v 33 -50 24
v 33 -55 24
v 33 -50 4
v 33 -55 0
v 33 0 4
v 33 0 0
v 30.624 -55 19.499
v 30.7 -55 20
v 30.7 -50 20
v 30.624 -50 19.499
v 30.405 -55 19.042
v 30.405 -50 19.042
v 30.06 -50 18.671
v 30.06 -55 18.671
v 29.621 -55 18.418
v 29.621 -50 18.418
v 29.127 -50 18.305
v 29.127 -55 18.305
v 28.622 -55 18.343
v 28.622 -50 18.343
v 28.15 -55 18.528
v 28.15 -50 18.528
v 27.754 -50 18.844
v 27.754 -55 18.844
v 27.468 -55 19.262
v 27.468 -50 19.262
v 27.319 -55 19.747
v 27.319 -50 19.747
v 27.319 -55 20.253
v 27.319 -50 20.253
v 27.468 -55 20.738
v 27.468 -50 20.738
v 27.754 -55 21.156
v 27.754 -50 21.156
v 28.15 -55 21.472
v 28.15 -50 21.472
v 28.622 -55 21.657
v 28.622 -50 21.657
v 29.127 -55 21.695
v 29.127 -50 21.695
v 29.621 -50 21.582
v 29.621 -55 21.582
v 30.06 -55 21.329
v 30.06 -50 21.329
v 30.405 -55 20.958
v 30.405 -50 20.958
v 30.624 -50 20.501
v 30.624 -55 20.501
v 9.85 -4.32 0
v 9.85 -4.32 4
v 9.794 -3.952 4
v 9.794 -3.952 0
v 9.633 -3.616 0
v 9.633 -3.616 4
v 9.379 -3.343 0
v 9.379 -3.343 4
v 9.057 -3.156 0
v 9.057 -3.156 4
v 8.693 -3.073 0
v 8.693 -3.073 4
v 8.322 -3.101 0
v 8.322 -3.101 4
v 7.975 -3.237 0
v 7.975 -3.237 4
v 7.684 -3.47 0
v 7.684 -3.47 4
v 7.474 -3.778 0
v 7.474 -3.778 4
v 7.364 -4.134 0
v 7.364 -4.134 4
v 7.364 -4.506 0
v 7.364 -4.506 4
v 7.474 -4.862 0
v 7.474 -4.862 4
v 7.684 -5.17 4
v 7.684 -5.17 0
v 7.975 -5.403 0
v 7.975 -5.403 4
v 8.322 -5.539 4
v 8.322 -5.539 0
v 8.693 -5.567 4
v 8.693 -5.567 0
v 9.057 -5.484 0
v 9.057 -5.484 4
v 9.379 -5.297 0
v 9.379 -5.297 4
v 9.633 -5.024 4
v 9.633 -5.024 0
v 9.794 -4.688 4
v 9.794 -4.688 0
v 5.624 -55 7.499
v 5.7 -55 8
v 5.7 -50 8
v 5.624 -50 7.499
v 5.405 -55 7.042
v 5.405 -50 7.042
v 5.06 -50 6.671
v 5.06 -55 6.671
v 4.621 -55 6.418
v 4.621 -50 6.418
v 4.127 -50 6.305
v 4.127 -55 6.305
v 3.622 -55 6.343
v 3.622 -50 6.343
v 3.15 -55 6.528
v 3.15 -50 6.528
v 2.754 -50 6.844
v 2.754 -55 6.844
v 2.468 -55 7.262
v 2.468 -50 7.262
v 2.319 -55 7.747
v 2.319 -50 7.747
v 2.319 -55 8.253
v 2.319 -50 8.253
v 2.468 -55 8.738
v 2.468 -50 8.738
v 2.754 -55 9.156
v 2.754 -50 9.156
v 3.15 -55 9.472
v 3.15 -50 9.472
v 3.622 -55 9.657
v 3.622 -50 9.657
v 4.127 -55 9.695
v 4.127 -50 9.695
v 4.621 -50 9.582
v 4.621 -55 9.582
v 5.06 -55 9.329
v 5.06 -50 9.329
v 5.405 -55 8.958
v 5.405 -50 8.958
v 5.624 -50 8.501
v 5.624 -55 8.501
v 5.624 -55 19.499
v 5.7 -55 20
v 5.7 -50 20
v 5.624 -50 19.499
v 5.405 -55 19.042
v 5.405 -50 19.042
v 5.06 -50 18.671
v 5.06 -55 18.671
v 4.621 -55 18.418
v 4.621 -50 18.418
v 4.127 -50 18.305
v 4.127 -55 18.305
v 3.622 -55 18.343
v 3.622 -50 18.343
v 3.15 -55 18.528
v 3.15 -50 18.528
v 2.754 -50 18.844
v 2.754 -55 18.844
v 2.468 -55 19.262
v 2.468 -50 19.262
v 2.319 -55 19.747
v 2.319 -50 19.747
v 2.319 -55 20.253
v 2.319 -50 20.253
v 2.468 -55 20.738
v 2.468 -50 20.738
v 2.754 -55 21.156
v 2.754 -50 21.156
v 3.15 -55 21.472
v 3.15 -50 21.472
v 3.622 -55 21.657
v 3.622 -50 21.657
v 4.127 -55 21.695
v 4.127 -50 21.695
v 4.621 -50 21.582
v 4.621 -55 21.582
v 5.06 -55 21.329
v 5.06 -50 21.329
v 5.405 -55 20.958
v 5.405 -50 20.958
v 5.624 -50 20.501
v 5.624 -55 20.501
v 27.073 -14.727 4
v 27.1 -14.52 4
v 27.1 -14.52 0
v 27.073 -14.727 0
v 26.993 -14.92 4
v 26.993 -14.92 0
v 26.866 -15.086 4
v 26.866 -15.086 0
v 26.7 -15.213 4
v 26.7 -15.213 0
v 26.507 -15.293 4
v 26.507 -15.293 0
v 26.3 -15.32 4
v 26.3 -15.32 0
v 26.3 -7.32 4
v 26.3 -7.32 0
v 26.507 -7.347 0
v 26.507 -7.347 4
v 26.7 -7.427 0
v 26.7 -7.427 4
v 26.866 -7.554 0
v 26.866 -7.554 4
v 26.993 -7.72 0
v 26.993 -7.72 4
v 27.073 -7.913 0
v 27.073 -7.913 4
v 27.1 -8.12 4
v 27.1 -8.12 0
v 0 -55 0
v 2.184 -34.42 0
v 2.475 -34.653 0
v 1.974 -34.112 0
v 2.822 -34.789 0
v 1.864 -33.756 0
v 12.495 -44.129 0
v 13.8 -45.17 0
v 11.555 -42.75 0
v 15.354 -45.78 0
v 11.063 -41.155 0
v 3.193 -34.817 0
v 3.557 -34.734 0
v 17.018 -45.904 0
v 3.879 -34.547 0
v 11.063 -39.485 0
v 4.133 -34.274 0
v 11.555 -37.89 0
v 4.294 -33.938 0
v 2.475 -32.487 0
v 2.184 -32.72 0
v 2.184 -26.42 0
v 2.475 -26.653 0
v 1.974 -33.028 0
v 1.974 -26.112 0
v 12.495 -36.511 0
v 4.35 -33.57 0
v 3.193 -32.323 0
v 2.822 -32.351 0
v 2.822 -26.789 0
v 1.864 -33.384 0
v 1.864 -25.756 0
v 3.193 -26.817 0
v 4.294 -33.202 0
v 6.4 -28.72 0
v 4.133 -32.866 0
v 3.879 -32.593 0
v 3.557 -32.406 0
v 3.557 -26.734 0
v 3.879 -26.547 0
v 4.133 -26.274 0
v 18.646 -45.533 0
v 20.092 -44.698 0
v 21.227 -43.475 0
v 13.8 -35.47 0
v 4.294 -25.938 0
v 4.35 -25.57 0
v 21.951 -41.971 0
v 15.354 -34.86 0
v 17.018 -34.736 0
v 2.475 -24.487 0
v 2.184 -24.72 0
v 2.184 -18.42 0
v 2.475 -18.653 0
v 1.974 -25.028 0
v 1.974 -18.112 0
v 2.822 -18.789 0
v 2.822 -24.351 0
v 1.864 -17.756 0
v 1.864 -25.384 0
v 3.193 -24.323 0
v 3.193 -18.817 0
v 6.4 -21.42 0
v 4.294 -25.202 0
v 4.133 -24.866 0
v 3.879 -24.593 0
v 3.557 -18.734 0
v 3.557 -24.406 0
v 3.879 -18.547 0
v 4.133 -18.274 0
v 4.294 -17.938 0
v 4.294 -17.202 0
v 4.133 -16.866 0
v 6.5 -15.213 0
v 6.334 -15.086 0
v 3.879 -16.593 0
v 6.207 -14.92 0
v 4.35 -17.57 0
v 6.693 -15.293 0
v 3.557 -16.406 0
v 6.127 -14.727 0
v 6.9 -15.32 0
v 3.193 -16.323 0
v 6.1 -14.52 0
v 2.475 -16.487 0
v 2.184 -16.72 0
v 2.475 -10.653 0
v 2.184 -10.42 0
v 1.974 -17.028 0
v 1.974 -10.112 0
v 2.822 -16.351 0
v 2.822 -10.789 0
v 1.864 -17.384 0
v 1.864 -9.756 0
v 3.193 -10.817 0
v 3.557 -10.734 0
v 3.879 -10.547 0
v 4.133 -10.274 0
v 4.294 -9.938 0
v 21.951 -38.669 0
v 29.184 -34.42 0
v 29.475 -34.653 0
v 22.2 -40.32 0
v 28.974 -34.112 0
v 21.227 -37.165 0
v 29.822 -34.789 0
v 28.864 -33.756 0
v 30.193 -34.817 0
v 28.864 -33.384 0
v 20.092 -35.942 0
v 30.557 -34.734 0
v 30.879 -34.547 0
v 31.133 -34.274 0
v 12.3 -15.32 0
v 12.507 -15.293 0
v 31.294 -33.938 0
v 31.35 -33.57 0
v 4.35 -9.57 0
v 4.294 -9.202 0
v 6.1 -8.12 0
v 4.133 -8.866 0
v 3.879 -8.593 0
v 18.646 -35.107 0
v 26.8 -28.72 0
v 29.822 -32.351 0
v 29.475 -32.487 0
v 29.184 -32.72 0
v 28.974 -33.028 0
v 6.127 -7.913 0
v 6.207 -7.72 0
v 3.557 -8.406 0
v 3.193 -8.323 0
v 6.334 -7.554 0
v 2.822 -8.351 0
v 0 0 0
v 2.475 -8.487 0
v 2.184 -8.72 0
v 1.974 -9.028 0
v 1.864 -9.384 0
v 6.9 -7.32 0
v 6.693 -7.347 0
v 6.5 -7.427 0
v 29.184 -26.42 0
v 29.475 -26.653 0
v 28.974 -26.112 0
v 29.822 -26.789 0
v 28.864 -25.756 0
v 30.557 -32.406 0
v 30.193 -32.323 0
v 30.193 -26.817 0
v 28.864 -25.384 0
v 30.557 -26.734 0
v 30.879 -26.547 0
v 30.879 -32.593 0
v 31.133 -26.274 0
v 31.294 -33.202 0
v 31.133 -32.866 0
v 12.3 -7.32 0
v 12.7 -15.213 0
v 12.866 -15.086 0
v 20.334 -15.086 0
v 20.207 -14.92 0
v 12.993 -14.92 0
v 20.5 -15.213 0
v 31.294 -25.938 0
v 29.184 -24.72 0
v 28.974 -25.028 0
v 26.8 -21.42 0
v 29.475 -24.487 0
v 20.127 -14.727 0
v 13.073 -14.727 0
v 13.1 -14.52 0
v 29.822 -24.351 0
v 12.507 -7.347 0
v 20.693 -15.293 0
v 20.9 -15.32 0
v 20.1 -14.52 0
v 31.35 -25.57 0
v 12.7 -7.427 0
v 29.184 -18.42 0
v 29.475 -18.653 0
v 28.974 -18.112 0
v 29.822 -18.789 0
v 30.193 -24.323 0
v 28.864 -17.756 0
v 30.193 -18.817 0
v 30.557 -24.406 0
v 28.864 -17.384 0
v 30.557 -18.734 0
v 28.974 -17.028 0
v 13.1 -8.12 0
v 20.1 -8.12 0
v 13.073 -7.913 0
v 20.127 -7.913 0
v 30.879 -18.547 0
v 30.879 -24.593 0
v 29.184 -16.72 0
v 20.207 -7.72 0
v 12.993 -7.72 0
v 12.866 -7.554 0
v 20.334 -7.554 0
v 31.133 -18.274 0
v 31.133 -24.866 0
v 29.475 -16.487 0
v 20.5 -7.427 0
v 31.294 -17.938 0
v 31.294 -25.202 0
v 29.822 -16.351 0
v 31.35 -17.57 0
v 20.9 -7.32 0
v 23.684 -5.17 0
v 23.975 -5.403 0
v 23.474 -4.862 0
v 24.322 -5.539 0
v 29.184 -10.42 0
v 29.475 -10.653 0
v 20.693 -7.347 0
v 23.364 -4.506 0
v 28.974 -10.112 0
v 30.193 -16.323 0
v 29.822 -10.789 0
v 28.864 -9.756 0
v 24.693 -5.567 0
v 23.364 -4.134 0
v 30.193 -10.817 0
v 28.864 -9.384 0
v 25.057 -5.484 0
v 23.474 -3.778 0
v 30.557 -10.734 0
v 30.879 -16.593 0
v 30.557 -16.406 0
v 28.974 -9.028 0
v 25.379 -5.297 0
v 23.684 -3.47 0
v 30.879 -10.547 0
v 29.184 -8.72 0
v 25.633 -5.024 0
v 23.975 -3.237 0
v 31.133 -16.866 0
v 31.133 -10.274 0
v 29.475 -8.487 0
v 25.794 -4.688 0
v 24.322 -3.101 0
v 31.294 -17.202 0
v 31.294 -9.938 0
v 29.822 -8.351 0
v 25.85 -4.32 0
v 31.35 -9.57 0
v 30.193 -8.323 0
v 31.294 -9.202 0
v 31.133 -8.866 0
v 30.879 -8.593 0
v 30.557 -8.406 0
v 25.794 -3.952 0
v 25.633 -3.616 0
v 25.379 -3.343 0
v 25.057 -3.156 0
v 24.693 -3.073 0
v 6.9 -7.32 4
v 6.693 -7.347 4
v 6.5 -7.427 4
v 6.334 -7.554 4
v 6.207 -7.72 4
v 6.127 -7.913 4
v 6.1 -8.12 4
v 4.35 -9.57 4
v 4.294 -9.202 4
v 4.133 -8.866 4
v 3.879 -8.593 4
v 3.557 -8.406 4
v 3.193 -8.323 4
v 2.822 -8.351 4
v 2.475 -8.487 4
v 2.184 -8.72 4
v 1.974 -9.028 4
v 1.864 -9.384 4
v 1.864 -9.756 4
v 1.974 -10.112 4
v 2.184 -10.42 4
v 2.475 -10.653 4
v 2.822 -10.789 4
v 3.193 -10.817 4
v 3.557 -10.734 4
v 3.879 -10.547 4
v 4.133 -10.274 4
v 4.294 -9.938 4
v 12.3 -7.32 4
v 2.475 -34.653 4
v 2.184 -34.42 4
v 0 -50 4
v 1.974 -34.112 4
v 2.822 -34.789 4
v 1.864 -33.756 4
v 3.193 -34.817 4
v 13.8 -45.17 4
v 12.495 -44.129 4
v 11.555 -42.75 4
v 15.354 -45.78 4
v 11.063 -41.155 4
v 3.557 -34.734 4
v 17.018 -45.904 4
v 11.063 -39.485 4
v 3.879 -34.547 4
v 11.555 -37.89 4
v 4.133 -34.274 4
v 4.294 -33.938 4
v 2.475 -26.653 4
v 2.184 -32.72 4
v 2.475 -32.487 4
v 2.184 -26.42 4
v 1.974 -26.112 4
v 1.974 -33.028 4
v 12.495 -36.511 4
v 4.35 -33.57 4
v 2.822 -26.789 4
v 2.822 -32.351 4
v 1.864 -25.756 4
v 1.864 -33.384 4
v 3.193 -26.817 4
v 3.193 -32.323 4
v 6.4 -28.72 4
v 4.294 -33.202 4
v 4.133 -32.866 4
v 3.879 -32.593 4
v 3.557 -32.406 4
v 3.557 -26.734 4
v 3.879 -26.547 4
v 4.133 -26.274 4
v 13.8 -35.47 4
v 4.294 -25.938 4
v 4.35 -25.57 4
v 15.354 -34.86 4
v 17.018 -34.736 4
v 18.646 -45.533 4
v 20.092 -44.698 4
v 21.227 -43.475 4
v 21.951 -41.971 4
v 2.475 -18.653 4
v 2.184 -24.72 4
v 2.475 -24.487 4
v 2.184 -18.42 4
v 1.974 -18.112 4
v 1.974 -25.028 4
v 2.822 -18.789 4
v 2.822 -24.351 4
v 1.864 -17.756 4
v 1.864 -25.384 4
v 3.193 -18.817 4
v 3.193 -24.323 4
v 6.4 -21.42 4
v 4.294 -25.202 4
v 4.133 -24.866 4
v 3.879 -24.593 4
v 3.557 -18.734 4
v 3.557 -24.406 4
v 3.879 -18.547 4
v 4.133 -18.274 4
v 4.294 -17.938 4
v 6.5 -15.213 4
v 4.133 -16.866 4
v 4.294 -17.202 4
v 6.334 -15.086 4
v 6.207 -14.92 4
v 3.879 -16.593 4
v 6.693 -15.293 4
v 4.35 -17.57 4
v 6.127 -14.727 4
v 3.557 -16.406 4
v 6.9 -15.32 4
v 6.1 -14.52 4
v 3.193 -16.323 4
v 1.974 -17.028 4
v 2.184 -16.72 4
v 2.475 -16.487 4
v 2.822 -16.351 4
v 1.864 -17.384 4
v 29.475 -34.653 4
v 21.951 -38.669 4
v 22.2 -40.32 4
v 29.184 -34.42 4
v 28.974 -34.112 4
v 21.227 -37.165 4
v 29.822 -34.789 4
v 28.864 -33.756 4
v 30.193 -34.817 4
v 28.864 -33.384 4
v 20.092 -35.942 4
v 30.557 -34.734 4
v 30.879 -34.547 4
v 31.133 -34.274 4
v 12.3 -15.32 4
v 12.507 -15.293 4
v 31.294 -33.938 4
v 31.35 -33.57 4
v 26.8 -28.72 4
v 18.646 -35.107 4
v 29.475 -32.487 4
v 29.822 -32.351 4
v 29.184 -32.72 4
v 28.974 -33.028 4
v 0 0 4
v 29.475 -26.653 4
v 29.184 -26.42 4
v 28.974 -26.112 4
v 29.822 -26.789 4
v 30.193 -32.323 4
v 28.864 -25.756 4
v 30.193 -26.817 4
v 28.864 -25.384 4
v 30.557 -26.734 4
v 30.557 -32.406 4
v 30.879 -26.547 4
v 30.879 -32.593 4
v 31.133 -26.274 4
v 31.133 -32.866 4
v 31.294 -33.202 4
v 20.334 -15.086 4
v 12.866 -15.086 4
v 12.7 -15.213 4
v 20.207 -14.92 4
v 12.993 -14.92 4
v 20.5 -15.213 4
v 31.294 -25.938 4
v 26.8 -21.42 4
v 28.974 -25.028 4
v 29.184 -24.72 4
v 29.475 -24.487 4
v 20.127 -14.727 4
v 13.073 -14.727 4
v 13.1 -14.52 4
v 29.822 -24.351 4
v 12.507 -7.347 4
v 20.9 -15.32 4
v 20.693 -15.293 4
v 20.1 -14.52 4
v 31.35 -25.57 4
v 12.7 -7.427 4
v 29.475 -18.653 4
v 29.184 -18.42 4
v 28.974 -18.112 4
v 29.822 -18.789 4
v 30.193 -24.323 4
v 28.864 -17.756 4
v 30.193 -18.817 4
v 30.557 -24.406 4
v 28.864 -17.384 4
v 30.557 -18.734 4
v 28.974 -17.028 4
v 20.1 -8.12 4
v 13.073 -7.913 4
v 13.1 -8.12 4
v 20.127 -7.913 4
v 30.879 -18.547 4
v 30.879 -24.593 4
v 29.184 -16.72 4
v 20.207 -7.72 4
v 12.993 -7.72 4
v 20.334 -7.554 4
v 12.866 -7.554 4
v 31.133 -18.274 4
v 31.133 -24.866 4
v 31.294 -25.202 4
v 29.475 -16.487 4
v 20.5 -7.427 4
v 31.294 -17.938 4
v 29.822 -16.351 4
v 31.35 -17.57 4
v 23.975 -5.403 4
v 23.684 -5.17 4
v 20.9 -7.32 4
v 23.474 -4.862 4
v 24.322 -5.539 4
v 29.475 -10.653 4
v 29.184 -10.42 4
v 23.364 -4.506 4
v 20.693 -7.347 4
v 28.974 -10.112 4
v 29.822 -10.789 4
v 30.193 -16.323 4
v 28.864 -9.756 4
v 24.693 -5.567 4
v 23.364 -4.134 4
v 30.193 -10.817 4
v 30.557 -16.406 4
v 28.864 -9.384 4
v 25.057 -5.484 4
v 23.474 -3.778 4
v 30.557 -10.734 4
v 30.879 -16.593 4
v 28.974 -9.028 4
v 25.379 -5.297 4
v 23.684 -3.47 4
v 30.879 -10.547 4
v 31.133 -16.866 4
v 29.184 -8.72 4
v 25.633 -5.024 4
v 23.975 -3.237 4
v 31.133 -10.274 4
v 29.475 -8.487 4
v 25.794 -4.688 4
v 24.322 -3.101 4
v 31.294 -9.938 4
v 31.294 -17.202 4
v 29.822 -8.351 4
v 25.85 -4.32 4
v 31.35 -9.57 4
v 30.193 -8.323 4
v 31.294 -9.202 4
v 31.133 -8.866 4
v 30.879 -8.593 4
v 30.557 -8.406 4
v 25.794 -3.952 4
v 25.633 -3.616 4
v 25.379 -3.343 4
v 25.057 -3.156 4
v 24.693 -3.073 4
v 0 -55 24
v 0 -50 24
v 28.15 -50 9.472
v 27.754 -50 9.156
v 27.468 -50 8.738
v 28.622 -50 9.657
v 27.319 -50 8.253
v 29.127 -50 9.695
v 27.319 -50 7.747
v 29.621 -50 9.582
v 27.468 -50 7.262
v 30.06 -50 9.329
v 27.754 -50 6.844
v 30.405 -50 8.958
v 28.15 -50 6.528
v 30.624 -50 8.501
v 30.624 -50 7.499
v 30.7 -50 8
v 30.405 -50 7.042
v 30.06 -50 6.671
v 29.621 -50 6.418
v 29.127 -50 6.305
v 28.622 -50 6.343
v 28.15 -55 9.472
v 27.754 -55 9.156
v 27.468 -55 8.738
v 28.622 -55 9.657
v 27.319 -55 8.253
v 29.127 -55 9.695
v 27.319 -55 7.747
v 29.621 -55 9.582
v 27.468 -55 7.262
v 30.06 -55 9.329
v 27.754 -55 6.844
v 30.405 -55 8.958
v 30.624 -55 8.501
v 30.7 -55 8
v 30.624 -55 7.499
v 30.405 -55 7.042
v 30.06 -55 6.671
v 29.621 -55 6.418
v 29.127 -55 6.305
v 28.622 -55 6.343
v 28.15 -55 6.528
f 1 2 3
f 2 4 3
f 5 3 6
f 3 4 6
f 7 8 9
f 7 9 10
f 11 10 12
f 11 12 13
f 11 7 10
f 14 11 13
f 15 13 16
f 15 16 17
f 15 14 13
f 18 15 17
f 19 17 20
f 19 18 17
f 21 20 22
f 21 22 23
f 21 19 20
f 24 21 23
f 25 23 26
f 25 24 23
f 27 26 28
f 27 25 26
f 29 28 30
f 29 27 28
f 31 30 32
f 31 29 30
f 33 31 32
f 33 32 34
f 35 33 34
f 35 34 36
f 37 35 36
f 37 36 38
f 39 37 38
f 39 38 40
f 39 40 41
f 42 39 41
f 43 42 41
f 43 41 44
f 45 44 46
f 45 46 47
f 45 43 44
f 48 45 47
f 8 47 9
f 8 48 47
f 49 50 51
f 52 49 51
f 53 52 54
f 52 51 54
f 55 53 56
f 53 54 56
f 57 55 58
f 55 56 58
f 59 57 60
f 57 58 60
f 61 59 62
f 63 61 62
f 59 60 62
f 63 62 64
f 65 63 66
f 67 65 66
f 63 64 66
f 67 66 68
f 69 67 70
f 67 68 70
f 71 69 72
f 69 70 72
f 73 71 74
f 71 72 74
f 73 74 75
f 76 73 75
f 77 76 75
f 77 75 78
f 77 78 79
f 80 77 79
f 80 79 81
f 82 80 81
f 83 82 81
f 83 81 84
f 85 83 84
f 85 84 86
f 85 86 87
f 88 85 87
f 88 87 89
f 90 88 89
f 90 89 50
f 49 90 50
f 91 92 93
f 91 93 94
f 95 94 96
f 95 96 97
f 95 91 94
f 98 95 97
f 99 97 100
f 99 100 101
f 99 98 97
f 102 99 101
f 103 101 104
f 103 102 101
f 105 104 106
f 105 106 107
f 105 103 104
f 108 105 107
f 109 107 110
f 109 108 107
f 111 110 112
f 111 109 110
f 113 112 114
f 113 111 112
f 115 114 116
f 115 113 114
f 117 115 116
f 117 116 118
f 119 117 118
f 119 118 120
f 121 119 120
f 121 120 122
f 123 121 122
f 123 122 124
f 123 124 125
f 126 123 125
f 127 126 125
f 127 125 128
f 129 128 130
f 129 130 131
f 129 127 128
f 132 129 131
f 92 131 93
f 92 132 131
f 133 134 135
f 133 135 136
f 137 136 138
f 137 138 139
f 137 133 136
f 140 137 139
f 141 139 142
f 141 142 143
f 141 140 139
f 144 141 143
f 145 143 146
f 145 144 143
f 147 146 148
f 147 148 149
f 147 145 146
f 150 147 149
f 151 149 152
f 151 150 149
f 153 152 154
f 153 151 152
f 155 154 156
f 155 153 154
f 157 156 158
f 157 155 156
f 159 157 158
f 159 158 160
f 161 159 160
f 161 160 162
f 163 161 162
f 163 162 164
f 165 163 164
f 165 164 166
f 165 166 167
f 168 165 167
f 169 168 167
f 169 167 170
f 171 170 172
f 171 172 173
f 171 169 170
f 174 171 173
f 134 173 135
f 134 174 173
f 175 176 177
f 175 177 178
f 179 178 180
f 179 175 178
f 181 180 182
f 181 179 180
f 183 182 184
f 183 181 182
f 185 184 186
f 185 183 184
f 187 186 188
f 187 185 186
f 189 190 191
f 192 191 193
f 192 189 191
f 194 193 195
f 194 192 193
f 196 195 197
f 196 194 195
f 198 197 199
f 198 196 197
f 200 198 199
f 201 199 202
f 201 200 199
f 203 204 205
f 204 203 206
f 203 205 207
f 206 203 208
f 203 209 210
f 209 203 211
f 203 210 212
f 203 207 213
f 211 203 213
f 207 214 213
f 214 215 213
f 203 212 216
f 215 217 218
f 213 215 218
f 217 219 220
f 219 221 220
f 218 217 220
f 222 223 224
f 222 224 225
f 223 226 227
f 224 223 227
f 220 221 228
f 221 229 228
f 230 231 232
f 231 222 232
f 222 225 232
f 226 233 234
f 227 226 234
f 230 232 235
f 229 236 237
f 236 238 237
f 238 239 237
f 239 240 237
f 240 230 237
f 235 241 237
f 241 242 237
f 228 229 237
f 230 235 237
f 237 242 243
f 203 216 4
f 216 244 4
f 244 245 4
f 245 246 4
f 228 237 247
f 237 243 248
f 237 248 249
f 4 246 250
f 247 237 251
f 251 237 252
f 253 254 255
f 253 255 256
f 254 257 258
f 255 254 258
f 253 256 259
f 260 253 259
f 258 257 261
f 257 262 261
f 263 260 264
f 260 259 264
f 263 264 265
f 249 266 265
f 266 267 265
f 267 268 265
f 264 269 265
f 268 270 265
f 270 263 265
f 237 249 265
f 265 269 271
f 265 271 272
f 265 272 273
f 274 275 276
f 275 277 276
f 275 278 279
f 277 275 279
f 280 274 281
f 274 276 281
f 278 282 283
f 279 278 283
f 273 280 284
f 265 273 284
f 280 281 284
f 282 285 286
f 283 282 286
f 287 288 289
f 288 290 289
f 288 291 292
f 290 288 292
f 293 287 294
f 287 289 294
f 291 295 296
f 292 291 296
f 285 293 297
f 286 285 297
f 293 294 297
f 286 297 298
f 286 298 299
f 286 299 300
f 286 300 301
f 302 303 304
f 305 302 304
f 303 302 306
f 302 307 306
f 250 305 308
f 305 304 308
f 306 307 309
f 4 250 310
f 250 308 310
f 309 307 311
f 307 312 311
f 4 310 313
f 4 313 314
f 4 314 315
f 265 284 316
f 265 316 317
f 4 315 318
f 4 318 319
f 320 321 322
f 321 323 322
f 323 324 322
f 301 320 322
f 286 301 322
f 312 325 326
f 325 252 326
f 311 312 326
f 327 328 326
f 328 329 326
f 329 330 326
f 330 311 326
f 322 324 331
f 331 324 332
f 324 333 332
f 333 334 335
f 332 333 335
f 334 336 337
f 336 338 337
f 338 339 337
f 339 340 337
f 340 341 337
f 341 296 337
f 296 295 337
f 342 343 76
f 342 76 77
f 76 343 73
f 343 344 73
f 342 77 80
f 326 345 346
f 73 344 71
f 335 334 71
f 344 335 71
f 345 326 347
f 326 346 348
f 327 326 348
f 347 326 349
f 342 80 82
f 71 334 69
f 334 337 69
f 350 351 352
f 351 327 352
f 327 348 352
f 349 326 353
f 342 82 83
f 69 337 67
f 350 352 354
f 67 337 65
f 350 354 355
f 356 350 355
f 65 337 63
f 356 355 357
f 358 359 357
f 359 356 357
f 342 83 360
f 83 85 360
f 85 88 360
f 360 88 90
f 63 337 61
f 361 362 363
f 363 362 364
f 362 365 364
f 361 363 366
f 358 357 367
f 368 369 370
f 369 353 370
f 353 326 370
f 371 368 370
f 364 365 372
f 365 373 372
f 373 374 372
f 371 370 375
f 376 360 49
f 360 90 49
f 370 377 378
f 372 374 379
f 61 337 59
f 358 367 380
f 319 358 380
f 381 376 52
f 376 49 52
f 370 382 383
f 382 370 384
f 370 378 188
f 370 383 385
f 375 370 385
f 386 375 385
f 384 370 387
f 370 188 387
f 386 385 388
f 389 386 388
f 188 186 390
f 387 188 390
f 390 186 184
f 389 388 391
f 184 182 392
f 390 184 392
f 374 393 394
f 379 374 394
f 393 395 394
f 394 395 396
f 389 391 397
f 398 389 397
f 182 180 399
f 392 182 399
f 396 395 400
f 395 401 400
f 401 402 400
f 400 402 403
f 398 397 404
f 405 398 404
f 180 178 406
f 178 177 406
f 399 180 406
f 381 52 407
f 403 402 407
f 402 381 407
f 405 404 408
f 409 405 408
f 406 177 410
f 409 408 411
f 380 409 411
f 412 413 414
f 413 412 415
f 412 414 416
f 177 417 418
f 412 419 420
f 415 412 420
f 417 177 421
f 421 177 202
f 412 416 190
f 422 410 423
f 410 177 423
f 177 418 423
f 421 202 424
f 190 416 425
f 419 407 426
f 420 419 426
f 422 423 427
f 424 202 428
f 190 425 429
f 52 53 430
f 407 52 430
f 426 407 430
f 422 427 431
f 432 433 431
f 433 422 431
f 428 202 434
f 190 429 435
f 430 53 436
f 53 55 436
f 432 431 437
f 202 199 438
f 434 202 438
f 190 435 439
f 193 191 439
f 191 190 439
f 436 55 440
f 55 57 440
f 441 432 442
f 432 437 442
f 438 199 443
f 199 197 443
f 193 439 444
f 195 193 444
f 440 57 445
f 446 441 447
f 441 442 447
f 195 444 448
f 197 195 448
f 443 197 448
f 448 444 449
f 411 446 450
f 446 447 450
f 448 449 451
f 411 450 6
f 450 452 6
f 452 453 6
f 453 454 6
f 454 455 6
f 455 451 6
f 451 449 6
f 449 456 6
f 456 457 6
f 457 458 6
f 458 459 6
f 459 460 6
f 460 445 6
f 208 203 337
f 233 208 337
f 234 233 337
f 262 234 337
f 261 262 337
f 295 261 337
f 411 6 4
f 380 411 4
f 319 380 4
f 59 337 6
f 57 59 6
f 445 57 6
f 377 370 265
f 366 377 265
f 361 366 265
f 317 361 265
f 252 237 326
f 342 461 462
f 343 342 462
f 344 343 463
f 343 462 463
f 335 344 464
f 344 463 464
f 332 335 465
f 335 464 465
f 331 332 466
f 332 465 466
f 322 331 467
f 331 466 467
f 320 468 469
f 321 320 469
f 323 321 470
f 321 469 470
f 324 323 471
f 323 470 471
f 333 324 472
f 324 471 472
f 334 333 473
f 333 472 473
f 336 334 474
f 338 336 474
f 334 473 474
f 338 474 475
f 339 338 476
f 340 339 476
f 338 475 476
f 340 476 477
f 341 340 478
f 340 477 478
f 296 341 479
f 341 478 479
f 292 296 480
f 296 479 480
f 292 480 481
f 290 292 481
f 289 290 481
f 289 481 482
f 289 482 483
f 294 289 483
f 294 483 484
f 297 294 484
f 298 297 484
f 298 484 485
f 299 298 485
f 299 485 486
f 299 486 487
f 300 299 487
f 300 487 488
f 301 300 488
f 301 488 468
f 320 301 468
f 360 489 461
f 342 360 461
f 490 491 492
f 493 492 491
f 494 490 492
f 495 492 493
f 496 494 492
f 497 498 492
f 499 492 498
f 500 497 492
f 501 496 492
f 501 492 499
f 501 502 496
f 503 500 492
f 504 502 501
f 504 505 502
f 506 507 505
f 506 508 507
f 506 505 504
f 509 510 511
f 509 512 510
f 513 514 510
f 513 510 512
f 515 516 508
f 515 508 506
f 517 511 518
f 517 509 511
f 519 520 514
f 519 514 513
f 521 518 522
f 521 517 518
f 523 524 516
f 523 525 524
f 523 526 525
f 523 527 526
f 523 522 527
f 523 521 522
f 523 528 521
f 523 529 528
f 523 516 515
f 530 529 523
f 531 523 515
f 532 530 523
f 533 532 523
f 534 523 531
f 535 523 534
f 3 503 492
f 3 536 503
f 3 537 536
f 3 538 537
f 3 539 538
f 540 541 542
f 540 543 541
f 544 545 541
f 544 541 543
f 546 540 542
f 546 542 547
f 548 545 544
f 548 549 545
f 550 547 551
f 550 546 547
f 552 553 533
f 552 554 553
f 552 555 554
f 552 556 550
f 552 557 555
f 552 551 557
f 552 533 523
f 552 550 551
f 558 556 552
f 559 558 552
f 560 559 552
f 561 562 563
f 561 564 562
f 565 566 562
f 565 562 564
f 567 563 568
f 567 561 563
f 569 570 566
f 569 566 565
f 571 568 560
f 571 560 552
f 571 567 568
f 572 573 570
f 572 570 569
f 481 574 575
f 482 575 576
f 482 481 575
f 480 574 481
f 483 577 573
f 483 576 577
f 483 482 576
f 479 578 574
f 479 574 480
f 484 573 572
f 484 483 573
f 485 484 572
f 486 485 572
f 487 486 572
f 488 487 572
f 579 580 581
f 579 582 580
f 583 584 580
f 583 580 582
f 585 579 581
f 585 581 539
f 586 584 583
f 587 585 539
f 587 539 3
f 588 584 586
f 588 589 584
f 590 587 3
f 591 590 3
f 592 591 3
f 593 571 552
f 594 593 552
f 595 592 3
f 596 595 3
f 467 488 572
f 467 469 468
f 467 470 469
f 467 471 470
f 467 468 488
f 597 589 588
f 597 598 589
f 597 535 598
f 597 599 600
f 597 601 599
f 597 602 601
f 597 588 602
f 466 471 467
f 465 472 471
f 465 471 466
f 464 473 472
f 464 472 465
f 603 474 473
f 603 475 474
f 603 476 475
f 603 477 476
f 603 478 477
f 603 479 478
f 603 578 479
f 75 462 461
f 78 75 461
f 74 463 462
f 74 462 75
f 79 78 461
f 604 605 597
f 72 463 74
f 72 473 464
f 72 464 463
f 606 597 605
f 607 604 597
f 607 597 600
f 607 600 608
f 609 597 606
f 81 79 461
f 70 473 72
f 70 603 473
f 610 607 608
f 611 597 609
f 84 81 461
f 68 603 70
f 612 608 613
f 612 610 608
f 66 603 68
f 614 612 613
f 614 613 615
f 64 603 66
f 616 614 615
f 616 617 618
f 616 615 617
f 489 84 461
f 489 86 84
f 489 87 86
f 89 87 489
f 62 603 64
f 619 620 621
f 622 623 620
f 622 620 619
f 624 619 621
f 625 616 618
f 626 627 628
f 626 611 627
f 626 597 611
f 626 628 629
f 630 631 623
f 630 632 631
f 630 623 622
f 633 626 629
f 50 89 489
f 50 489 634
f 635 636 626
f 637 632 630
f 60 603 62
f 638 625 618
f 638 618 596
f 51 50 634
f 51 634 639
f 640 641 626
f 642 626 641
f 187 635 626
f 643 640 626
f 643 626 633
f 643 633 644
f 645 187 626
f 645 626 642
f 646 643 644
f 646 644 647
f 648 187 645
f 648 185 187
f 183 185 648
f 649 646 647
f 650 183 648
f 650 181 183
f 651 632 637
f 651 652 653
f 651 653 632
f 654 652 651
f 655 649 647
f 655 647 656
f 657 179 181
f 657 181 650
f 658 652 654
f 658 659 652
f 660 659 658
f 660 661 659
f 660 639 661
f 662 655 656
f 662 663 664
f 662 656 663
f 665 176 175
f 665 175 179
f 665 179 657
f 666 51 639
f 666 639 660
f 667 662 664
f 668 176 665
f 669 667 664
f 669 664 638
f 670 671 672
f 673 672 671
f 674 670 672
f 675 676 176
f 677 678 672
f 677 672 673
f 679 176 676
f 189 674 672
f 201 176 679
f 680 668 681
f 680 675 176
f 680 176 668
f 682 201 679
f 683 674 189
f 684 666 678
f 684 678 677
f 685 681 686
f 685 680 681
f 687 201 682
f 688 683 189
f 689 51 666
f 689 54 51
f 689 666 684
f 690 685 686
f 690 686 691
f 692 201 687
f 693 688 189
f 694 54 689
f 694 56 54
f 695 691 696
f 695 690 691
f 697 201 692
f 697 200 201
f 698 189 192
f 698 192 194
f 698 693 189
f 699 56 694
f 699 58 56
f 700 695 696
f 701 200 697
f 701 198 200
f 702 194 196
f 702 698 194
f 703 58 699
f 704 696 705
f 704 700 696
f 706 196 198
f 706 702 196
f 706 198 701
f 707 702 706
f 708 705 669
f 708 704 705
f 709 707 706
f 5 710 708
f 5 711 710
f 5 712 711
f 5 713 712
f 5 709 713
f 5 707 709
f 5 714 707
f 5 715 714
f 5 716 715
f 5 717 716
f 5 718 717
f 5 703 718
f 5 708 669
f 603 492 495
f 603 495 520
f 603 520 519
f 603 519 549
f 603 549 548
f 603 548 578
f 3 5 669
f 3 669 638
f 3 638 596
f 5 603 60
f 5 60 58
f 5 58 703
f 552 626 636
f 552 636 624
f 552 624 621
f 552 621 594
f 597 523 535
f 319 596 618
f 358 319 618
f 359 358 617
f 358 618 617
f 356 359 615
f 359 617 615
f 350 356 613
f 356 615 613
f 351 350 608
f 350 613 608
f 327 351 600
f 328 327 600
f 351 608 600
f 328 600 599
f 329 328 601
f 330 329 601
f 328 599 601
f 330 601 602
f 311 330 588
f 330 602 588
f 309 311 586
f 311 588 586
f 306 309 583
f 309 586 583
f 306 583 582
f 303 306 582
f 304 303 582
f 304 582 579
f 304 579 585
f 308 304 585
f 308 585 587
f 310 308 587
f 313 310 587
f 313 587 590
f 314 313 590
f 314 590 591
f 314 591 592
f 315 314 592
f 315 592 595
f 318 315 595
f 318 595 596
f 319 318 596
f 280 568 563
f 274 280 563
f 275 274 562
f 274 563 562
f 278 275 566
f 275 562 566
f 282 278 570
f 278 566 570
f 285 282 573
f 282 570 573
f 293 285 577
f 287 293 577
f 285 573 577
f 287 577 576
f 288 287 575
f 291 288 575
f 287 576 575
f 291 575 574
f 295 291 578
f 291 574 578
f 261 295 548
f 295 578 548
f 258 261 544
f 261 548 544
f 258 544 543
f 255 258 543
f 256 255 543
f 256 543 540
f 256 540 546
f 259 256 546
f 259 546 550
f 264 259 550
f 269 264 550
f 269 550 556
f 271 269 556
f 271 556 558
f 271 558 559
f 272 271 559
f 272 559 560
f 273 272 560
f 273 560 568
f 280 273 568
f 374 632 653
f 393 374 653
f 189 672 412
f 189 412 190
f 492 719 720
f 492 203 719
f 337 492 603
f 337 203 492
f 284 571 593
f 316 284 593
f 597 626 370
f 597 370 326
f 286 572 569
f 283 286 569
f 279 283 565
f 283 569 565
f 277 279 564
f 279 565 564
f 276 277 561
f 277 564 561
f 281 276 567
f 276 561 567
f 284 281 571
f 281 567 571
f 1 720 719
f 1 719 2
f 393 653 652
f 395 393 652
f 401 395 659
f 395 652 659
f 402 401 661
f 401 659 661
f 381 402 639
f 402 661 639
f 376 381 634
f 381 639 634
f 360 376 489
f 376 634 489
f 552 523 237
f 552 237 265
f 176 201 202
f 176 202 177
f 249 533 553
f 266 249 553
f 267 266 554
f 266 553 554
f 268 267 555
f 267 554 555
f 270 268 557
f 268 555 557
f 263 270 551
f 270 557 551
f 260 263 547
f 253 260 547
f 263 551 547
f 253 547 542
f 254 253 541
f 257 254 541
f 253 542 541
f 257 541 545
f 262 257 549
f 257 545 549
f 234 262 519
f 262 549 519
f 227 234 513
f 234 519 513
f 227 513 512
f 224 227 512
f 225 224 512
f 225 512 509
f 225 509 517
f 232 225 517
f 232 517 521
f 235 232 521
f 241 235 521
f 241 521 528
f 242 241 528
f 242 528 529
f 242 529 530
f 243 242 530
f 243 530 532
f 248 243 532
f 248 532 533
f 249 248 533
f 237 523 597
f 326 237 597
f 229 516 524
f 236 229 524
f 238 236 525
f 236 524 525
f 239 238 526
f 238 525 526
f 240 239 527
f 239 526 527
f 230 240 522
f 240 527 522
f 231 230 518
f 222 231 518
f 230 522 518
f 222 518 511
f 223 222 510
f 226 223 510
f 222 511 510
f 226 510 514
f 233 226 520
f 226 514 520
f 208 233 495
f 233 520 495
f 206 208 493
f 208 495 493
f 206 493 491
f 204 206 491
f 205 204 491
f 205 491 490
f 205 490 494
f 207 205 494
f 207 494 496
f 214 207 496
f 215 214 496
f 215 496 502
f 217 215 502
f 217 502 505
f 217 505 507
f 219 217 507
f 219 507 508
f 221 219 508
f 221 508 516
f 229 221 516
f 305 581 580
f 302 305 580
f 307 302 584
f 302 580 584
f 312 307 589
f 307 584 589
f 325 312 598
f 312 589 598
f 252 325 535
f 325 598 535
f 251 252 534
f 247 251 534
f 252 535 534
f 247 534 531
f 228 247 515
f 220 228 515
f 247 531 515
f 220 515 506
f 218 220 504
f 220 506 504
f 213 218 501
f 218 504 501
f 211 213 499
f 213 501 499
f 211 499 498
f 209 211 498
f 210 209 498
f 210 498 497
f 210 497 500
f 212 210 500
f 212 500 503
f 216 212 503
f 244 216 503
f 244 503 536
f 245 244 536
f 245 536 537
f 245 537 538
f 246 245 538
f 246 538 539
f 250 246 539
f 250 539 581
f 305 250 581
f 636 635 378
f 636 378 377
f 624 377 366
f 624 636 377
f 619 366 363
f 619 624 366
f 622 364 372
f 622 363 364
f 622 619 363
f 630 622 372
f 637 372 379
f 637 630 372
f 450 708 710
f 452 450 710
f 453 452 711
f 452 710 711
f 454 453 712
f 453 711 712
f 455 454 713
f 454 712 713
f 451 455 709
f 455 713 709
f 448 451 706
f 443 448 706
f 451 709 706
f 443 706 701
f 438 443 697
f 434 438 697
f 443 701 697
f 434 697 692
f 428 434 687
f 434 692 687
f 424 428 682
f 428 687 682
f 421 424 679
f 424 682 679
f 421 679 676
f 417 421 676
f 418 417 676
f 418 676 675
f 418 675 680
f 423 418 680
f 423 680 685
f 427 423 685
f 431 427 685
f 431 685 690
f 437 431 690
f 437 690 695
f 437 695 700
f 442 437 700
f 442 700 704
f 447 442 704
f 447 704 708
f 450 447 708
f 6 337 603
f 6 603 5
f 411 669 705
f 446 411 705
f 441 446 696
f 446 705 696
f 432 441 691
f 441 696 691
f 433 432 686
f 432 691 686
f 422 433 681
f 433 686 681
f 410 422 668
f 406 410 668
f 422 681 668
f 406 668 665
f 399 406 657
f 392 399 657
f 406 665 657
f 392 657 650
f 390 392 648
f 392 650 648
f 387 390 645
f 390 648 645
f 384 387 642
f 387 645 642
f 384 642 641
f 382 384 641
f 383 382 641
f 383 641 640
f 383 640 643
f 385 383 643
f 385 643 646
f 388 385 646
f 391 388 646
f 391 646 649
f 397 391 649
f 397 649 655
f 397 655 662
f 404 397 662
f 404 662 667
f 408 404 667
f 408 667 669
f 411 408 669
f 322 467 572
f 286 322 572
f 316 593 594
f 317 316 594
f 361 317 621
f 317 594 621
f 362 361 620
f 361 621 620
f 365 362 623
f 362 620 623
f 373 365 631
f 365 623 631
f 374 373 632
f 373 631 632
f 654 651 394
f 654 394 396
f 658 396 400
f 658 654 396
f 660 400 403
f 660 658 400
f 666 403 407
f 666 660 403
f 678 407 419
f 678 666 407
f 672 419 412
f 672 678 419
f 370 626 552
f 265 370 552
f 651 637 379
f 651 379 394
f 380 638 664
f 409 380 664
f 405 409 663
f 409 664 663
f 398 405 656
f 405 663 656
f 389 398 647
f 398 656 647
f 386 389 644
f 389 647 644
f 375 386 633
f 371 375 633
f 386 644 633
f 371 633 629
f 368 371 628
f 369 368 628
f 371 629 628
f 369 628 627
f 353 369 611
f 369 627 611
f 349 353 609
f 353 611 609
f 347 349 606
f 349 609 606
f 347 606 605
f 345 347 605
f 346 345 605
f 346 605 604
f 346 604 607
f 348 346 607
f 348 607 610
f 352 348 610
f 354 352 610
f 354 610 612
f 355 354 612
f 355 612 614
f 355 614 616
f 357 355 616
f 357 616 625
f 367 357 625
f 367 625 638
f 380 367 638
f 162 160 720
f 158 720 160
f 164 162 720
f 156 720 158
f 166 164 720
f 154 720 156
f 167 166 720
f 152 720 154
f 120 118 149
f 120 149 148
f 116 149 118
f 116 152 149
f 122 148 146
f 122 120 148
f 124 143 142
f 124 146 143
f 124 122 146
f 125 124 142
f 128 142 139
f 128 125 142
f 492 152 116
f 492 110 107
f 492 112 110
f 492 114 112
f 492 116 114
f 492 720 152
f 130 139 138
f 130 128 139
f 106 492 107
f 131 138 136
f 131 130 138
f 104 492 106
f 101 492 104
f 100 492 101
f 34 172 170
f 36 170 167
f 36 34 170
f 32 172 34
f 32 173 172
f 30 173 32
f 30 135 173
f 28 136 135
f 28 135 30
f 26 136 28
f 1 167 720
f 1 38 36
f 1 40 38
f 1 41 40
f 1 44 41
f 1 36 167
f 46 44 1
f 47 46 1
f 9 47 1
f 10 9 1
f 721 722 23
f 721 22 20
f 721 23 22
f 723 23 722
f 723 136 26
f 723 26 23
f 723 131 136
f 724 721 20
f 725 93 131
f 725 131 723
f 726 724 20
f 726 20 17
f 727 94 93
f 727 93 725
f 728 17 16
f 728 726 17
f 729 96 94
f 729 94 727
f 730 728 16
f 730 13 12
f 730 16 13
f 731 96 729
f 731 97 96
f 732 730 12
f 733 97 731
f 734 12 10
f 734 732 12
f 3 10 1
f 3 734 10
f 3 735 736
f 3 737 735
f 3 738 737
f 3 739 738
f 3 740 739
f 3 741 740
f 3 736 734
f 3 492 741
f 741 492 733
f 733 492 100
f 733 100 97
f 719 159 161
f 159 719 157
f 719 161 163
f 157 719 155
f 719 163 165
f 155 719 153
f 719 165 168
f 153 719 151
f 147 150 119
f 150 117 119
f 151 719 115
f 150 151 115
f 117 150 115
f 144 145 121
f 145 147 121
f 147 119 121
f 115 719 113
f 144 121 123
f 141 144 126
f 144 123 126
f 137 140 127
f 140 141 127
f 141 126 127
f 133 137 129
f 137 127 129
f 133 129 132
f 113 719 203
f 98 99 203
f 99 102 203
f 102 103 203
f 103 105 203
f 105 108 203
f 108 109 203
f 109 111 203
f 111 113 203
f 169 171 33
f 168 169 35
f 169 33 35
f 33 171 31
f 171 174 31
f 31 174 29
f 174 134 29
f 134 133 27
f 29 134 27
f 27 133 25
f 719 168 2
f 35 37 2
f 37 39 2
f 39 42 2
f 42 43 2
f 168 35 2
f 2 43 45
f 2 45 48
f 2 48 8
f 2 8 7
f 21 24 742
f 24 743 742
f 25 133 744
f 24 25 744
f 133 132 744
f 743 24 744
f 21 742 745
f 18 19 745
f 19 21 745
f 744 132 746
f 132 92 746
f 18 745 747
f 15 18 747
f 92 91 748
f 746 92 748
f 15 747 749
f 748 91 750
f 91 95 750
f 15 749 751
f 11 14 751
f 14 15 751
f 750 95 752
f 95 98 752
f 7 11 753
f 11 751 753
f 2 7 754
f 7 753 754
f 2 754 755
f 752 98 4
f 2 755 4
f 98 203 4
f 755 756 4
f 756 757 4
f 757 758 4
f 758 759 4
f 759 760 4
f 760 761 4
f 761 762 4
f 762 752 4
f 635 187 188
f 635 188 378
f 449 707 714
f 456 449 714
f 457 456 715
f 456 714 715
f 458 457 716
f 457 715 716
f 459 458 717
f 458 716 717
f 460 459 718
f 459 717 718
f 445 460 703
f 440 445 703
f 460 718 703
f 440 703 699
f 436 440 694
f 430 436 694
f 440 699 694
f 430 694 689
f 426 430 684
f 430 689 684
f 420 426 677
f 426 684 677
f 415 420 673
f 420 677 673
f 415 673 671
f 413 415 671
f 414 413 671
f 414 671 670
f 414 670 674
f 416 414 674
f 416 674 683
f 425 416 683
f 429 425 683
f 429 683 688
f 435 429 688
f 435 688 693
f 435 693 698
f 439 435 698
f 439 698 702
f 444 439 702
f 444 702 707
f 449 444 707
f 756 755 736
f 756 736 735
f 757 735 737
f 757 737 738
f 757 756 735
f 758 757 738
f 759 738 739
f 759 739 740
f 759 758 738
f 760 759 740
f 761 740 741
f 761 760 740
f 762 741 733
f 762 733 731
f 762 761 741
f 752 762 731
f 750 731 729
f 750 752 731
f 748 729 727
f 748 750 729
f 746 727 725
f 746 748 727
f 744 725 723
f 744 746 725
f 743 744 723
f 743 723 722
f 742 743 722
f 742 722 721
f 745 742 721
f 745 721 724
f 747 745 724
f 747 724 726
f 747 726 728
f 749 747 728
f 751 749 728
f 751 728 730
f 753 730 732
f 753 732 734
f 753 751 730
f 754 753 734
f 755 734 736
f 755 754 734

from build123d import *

# Parameters (mm, degrees)
SKETCH1_W                    = 33
SKETCH1_H                    = 55
BOSS_EXTRUDE1_DEPTH          = 4
SKETCH2_W                    = 33
SKETCH2_H                    = 5
BOSS_EXTRUDE2_DEPTH          = 20
CUT_EXTRUDE1_REACH           = 69.186
SKETCH3_R                    = 1.25
SKETCH3_R_2                  = 5.6
M3_START                     = -55
M3_CLEARANCE_HOLE1_OUTLINE_R = 1.7
M3_CLEARANCE_HOLE1_DEPTH     = 5


# Read off the part's stored shape, not the designer's step: M3 Clearance Hole1
with BuildPart() as part:
    # Sketch1 → Boss-Extrude1 (new body)
    with BuildSketch(Plane.XY):
        with Locations((16.5, -27.5)):
            Rectangle(SKETCH1_W, SKETCH1_H)
    extrude(amount=BOSS_EXTRUDE1_DEPTH)

    # Sketch2 → Boss-Extrude2 (add)
    with BuildSketch(Plane.XY.offset(4)):
        with Locations((16.5, -52.5)):
            Rectangle(SKETCH2_W, SKETCH2_H)
    extrude(amount=BOSS_EXTRUDE2_DEPTH)

    # Sketch3 → Cut-Extrude1 (cut, up to next)
    with BuildSketch(Plane.XY.offset(4), mode=Mode.PRIVATE) as cut_extrude1_sk1:
        with Locations((30.1, -9.57)):
            Circle(SKETCH3_R)
    cut_extrude1_tool1 = extrude(cut_extrude1_sk1.sketch, amount=-CUT_EXTRUDE1_REACH, mode=Mode.PRIVATE) & part.part
    # Sketch3 → Cut-Extrude1 (cut, up to next)
    with BuildSketch(Plane.XY.offset(4), mode=Mode.PRIVATE) as cut_extrude1_sk2:
        with Locations((30.1, -17.57)):
            Circle(SKETCH3_R)
    cut_extrude1_tool2 = extrude(cut_extrude1_sk2.sketch, amount=-CUT_EXTRUDE1_REACH, mode=Mode.PRIVATE) & part.part
    # Sketch3 → Cut-Extrude1 (cut, up to next)
    with BuildSketch(Plane.XY.offset(4), mode=Mode.PRIVATE) as cut_extrude1_sk3:
        with Locations((30.1, -25.57)):
            Circle(SKETCH3_R)
    cut_extrude1_tool3 = extrude(cut_extrude1_sk3.sketch, amount=-CUT_EXTRUDE1_REACH, mode=Mode.PRIVATE) & part.part
    # Sketch3 → Cut-Extrude1 (cut, up to next)
    with BuildSketch(Plane.XY.offset(4), mode=Mode.PRIVATE) as cut_extrude1_sk4:
        with Locations((30.1, -33.57)):
            Circle(SKETCH3_R)
    cut_extrude1_tool4 = extrude(cut_extrude1_sk4.sketch, amount=-CUT_EXTRUDE1_REACH, mode=Mode.PRIVATE) & part.part
    # Sketch3 → Cut-Extrude1 (cut, up to next)
    with BuildSketch(Plane.XY.offset(4), mode=Mode.PRIVATE) as cut_extrude1_sk5:
        with Locations((3.1, -33.57)):
            Circle(SKETCH3_R)
    cut_extrude1_tool5 = extrude(cut_extrude1_sk5.sketch, amount=-CUT_EXTRUDE1_REACH, mode=Mode.PRIVATE) & part.part
    # Sketch3 → Cut-Extrude1 (cut, up to next)
    with BuildSketch(Plane.XY.offset(4), mode=Mode.PRIVATE) as cut_extrude1_sk6:
        with Locations((3.1, -25.57)):
            Circle(SKETCH3_R)
    cut_extrude1_tool6 = extrude(cut_extrude1_sk6.sketch, amount=-CUT_EXTRUDE1_REACH, mode=Mode.PRIVATE) & part.part
    # Sketch3 → Cut-Extrude1 (cut, up to next)
    with BuildSketch(Plane.XY.offset(4), mode=Mode.PRIVATE) as cut_extrude1_sk7:
        with Locations((3.1, -17.57)):
            Circle(SKETCH3_R)
    cut_extrude1_tool7 = extrude(cut_extrude1_sk7.sketch, amount=-CUT_EXTRUDE1_REACH, mode=Mode.PRIVATE) & part.part
    # Sketch3 → Cut-Extrude1 (cut, up to next)
    with BuildSketch(Plane.XY.offset(4), mode=Mode.PRIVATE) as cut_extrude1_sk8:
        with Locations((3.1, -9.57)):
            Circle(SKETCH3_R)
    cut_extrude1_tool8 = extrude(cut_extrude1_sk8.sketch, amount=-CUT_EXTRUDE1_REACH, mode=Mode.PRIVATE) & part.part
    # Sketch3 → Cut-Extrude1 (cut, up to next)
    with BuildSketch(Plane.XY.offset(4), mode=Mode.PRIVATE) as cut_extrude1_sk9:
        with Locations((8.6, -4.32)):
            Circle(SKETCH3_R)
    cut_extrude1_tool9 = extrude(cut_extrude1_sk9.sketch, amount=-CUT_EXTRUDE1_REACH, mode=Mode.PRIVATE) & part.part
    # Sketch3 → Cut-Extrude1 (cut, up to next)
    with BuildSketch(Plane.XY.offset(4), mode=Mode.PRIVATE) as cut_extrude1_sk10:
        with Locations((24.6, -4.32)):
            Circle(SKETCH3_R)
    cut_extrude1_tool10 = extrude(cut_extrude1_sk10.sketch, amount=-CUT_EXTRUDE1_REACH, mode=Mode.PRIVATE) & part.part
    # Sketch3 → Cut-Extrude1 (cut, up to next)
    with BuildSketch(Plane.XY.offset(4), mode=Mode.PRIVATE) as cut_extrude1_sk11:
        with Locations((16.6, -40.32)):
            Circle(SKETCH3_R_2)
    cut_extrude1_tool11 = extrude(cut_extrude1_sk11.sketch, amount=-CUT_EXTRUDE1_REACH, mode=Mode.PRIVATE) & part.part
    # Sketch3 → Cut-Extrude1 (cut, up to next)
    with BuildSketch(Plane.XY.offset(4), mode=Mode.PRIVATE) as cut_extrude1_sk12:
        with BuildLine():
            Line((6.9, -15.32), (12.3, -15.32))
            ThreePointArc((12.3, -15.32), (12.865685425, -15.085685425), (13.1, -14.52))
            Line((13.1, -14.52), (13.1, -8.12))
            ThreePointArc((13.1, -8.12), (12.865685425, -7.554314575), (12.3, -7.32))
            Line((12.3, -7.32), (6.9, -7.32))
            ThreePointArc((6.9, -7.32), (6.334314575, -7.554314575), (6.1, -8.12))
            Line((6.1, -8.12), (6.1, -14.52))
            ThreePointArc((6.1, -14.52), (6.334314575, -15.085685425), (6.9, -15.32))
        make_face()
    cut_extrude1_tool12 = extrude(cut_extrude1_sk12.sketch, amount=-CUT_EXTRUDE1_REACH, mode=Mode.PRIVATE) & part.part
    # Sketch3 → Cut-Extrude1 (cut, up to next)
    with BuildSketch(Plane.XY.offset(4), mode=Mode.PRIVATE) as cut_extrude1_sk13:
        with BuildLine():
            Line((27.1, -8.12), (27.1, -14.52))
            ThreePointArc((27.1, -14.52), (26.865685425, -15.085685425), (26.3, -15.32))
            Line((26.3, -15.32), (20.9, -15.32))
            ThreePointArc((20.9, -15.32), (20.334314575, -15.085685425), (20.1, -14.52))
            Line((20.1, -14.52), (20.1, -8.12))
            ThreePointArc((20.1, -8.12), (20.334314575, -7.554314575), (20.9, -7.32))
            Line((20.9, -7.32), (26.3, -7.32))
            ThreePointArc((26.3, -7.32), (26.865685425, -7.554314575), (27.1, -8.12))
        make_face()
    cut_extrude1_tool13 = extrude(cut_extrude1_sk13.sketch, amount=-CUT_EXTRUDE1_REACH, mode=Mode.PRIVATE) & part.part
    # Sketch3 → Cut-Extrude1 (cut, up to next)
    with BuildSketch(Plane.XY.offset(4), mode=Mode.PRIVATE) as cut_extrude1_sk14:
        Polygon((6.4, -21.42), (16.5, -21.42), (16.7, -21.42), (26.8, -21.42), (26.8, -28.72), (16.7, -28.72), (16.5, -28.72), (6.4, -28.72), align=None)
    cut_extrude1_tool14 = extrude(cut_extrude1_sk14.sketch, amount=-CUT_EXTRUDE1_REACH, mode=Mode.PRIVATE) & part.part
    add(cut_extrude1_tool1.solids().sort_by_distance((30.1, -9.57, 4))[0], mode=Mode.SUBTRACT)
    add(cut_extrude1_tool2.solids().sort_by_distance((30.1, -17.57, 4))[0], mode=Mode.SUBTRACT)
    add(cut_extrude1_tool3.solids().sort_by_distance((30.1, -25.57, 4))[0], mode=Mode.SUBTRACT)
    add(cut_extrude1_tool4.solids().sort_by_distance((30.1, -33.57, 4))[0], mode=Mode.SUBTRACT)
    add(cut_extrude1_tool5.solids().sort_by_distance((3.1, -33.57, 4))[0], mode=Mode.SUBTRACT)
    add(cut_extrude1_tool6.solids().sort_by_distance((3.1, -25.57, 4))[0], mode=Mode.SUBTRACT)
    add(cut_extrude1_tool7.solids().sort_by_distance((3.1, -17.57, 4))[0], mode=Mode.SUBTRACT)
    add(cut_extrude1_tool8.solids().sort_by_distance((3.1, -9.57, 4))[0], mode=Mode.SUBTRACT)
    add(cut_extrude1_tool9.solids().sort_by_distance((8.6, -4.32, 4))[0], mode=Mode.SUBTRACT)
    add(cut_extrude1_tool10.solids().sort_by_distance((24.6, -4.32, 4))[0], mode=Mode.SUBTRACT)
    add(cut_extrude1_tool11.solids().sort_by_distance((16.6, -40.32, 4))[0], mode=Mode.SUBTRACT)
    add(cut_extrude1_tool12.solids().sort_by_distance((9.6, -11.32, 4))[0], mode=Mode.SUBTRACT)
    add(cut_extrude1_tool13.solids().sort_by_distance((23.6, -11.32, 4))[0], mode=Mode.SUBTRACT)
    add(cut_extrude1_tool14.solids().sort_by_distance((16.6, -25.07, 4))[0], mode=Mode.SUBTRACT)

    # M3 Clearance Hole1 outline → M3 Clearance Hole1 (cut)
    with BuildSketch(Plane(origin=(0, 0, 0), x_dir=(1, 0, 0), z_dir=(0, 1, 0)).offset(M3_START)):
        with Locations((29, -8)):
            Circle(M3_CLEARANCE_HOLE1_OUTLINE_R)
        with Locations((4, -20)):
            Circle(M3_CLEARANCE_HOLE1_OUTLINE_R)
        with Locations((29, -20)):
            Circle(M3_CLEARANCE_HOLE1_OUTLINE_R)
        with Locations((4, -8)):
            Circle(M3_CLEARANCE_HOLE1_OUTLINE_R)
    extrude(amount=M3_CLEARANCE_HOLE1_DEPTH, mode=Mode.SUBTRACT)


solid = part.part
